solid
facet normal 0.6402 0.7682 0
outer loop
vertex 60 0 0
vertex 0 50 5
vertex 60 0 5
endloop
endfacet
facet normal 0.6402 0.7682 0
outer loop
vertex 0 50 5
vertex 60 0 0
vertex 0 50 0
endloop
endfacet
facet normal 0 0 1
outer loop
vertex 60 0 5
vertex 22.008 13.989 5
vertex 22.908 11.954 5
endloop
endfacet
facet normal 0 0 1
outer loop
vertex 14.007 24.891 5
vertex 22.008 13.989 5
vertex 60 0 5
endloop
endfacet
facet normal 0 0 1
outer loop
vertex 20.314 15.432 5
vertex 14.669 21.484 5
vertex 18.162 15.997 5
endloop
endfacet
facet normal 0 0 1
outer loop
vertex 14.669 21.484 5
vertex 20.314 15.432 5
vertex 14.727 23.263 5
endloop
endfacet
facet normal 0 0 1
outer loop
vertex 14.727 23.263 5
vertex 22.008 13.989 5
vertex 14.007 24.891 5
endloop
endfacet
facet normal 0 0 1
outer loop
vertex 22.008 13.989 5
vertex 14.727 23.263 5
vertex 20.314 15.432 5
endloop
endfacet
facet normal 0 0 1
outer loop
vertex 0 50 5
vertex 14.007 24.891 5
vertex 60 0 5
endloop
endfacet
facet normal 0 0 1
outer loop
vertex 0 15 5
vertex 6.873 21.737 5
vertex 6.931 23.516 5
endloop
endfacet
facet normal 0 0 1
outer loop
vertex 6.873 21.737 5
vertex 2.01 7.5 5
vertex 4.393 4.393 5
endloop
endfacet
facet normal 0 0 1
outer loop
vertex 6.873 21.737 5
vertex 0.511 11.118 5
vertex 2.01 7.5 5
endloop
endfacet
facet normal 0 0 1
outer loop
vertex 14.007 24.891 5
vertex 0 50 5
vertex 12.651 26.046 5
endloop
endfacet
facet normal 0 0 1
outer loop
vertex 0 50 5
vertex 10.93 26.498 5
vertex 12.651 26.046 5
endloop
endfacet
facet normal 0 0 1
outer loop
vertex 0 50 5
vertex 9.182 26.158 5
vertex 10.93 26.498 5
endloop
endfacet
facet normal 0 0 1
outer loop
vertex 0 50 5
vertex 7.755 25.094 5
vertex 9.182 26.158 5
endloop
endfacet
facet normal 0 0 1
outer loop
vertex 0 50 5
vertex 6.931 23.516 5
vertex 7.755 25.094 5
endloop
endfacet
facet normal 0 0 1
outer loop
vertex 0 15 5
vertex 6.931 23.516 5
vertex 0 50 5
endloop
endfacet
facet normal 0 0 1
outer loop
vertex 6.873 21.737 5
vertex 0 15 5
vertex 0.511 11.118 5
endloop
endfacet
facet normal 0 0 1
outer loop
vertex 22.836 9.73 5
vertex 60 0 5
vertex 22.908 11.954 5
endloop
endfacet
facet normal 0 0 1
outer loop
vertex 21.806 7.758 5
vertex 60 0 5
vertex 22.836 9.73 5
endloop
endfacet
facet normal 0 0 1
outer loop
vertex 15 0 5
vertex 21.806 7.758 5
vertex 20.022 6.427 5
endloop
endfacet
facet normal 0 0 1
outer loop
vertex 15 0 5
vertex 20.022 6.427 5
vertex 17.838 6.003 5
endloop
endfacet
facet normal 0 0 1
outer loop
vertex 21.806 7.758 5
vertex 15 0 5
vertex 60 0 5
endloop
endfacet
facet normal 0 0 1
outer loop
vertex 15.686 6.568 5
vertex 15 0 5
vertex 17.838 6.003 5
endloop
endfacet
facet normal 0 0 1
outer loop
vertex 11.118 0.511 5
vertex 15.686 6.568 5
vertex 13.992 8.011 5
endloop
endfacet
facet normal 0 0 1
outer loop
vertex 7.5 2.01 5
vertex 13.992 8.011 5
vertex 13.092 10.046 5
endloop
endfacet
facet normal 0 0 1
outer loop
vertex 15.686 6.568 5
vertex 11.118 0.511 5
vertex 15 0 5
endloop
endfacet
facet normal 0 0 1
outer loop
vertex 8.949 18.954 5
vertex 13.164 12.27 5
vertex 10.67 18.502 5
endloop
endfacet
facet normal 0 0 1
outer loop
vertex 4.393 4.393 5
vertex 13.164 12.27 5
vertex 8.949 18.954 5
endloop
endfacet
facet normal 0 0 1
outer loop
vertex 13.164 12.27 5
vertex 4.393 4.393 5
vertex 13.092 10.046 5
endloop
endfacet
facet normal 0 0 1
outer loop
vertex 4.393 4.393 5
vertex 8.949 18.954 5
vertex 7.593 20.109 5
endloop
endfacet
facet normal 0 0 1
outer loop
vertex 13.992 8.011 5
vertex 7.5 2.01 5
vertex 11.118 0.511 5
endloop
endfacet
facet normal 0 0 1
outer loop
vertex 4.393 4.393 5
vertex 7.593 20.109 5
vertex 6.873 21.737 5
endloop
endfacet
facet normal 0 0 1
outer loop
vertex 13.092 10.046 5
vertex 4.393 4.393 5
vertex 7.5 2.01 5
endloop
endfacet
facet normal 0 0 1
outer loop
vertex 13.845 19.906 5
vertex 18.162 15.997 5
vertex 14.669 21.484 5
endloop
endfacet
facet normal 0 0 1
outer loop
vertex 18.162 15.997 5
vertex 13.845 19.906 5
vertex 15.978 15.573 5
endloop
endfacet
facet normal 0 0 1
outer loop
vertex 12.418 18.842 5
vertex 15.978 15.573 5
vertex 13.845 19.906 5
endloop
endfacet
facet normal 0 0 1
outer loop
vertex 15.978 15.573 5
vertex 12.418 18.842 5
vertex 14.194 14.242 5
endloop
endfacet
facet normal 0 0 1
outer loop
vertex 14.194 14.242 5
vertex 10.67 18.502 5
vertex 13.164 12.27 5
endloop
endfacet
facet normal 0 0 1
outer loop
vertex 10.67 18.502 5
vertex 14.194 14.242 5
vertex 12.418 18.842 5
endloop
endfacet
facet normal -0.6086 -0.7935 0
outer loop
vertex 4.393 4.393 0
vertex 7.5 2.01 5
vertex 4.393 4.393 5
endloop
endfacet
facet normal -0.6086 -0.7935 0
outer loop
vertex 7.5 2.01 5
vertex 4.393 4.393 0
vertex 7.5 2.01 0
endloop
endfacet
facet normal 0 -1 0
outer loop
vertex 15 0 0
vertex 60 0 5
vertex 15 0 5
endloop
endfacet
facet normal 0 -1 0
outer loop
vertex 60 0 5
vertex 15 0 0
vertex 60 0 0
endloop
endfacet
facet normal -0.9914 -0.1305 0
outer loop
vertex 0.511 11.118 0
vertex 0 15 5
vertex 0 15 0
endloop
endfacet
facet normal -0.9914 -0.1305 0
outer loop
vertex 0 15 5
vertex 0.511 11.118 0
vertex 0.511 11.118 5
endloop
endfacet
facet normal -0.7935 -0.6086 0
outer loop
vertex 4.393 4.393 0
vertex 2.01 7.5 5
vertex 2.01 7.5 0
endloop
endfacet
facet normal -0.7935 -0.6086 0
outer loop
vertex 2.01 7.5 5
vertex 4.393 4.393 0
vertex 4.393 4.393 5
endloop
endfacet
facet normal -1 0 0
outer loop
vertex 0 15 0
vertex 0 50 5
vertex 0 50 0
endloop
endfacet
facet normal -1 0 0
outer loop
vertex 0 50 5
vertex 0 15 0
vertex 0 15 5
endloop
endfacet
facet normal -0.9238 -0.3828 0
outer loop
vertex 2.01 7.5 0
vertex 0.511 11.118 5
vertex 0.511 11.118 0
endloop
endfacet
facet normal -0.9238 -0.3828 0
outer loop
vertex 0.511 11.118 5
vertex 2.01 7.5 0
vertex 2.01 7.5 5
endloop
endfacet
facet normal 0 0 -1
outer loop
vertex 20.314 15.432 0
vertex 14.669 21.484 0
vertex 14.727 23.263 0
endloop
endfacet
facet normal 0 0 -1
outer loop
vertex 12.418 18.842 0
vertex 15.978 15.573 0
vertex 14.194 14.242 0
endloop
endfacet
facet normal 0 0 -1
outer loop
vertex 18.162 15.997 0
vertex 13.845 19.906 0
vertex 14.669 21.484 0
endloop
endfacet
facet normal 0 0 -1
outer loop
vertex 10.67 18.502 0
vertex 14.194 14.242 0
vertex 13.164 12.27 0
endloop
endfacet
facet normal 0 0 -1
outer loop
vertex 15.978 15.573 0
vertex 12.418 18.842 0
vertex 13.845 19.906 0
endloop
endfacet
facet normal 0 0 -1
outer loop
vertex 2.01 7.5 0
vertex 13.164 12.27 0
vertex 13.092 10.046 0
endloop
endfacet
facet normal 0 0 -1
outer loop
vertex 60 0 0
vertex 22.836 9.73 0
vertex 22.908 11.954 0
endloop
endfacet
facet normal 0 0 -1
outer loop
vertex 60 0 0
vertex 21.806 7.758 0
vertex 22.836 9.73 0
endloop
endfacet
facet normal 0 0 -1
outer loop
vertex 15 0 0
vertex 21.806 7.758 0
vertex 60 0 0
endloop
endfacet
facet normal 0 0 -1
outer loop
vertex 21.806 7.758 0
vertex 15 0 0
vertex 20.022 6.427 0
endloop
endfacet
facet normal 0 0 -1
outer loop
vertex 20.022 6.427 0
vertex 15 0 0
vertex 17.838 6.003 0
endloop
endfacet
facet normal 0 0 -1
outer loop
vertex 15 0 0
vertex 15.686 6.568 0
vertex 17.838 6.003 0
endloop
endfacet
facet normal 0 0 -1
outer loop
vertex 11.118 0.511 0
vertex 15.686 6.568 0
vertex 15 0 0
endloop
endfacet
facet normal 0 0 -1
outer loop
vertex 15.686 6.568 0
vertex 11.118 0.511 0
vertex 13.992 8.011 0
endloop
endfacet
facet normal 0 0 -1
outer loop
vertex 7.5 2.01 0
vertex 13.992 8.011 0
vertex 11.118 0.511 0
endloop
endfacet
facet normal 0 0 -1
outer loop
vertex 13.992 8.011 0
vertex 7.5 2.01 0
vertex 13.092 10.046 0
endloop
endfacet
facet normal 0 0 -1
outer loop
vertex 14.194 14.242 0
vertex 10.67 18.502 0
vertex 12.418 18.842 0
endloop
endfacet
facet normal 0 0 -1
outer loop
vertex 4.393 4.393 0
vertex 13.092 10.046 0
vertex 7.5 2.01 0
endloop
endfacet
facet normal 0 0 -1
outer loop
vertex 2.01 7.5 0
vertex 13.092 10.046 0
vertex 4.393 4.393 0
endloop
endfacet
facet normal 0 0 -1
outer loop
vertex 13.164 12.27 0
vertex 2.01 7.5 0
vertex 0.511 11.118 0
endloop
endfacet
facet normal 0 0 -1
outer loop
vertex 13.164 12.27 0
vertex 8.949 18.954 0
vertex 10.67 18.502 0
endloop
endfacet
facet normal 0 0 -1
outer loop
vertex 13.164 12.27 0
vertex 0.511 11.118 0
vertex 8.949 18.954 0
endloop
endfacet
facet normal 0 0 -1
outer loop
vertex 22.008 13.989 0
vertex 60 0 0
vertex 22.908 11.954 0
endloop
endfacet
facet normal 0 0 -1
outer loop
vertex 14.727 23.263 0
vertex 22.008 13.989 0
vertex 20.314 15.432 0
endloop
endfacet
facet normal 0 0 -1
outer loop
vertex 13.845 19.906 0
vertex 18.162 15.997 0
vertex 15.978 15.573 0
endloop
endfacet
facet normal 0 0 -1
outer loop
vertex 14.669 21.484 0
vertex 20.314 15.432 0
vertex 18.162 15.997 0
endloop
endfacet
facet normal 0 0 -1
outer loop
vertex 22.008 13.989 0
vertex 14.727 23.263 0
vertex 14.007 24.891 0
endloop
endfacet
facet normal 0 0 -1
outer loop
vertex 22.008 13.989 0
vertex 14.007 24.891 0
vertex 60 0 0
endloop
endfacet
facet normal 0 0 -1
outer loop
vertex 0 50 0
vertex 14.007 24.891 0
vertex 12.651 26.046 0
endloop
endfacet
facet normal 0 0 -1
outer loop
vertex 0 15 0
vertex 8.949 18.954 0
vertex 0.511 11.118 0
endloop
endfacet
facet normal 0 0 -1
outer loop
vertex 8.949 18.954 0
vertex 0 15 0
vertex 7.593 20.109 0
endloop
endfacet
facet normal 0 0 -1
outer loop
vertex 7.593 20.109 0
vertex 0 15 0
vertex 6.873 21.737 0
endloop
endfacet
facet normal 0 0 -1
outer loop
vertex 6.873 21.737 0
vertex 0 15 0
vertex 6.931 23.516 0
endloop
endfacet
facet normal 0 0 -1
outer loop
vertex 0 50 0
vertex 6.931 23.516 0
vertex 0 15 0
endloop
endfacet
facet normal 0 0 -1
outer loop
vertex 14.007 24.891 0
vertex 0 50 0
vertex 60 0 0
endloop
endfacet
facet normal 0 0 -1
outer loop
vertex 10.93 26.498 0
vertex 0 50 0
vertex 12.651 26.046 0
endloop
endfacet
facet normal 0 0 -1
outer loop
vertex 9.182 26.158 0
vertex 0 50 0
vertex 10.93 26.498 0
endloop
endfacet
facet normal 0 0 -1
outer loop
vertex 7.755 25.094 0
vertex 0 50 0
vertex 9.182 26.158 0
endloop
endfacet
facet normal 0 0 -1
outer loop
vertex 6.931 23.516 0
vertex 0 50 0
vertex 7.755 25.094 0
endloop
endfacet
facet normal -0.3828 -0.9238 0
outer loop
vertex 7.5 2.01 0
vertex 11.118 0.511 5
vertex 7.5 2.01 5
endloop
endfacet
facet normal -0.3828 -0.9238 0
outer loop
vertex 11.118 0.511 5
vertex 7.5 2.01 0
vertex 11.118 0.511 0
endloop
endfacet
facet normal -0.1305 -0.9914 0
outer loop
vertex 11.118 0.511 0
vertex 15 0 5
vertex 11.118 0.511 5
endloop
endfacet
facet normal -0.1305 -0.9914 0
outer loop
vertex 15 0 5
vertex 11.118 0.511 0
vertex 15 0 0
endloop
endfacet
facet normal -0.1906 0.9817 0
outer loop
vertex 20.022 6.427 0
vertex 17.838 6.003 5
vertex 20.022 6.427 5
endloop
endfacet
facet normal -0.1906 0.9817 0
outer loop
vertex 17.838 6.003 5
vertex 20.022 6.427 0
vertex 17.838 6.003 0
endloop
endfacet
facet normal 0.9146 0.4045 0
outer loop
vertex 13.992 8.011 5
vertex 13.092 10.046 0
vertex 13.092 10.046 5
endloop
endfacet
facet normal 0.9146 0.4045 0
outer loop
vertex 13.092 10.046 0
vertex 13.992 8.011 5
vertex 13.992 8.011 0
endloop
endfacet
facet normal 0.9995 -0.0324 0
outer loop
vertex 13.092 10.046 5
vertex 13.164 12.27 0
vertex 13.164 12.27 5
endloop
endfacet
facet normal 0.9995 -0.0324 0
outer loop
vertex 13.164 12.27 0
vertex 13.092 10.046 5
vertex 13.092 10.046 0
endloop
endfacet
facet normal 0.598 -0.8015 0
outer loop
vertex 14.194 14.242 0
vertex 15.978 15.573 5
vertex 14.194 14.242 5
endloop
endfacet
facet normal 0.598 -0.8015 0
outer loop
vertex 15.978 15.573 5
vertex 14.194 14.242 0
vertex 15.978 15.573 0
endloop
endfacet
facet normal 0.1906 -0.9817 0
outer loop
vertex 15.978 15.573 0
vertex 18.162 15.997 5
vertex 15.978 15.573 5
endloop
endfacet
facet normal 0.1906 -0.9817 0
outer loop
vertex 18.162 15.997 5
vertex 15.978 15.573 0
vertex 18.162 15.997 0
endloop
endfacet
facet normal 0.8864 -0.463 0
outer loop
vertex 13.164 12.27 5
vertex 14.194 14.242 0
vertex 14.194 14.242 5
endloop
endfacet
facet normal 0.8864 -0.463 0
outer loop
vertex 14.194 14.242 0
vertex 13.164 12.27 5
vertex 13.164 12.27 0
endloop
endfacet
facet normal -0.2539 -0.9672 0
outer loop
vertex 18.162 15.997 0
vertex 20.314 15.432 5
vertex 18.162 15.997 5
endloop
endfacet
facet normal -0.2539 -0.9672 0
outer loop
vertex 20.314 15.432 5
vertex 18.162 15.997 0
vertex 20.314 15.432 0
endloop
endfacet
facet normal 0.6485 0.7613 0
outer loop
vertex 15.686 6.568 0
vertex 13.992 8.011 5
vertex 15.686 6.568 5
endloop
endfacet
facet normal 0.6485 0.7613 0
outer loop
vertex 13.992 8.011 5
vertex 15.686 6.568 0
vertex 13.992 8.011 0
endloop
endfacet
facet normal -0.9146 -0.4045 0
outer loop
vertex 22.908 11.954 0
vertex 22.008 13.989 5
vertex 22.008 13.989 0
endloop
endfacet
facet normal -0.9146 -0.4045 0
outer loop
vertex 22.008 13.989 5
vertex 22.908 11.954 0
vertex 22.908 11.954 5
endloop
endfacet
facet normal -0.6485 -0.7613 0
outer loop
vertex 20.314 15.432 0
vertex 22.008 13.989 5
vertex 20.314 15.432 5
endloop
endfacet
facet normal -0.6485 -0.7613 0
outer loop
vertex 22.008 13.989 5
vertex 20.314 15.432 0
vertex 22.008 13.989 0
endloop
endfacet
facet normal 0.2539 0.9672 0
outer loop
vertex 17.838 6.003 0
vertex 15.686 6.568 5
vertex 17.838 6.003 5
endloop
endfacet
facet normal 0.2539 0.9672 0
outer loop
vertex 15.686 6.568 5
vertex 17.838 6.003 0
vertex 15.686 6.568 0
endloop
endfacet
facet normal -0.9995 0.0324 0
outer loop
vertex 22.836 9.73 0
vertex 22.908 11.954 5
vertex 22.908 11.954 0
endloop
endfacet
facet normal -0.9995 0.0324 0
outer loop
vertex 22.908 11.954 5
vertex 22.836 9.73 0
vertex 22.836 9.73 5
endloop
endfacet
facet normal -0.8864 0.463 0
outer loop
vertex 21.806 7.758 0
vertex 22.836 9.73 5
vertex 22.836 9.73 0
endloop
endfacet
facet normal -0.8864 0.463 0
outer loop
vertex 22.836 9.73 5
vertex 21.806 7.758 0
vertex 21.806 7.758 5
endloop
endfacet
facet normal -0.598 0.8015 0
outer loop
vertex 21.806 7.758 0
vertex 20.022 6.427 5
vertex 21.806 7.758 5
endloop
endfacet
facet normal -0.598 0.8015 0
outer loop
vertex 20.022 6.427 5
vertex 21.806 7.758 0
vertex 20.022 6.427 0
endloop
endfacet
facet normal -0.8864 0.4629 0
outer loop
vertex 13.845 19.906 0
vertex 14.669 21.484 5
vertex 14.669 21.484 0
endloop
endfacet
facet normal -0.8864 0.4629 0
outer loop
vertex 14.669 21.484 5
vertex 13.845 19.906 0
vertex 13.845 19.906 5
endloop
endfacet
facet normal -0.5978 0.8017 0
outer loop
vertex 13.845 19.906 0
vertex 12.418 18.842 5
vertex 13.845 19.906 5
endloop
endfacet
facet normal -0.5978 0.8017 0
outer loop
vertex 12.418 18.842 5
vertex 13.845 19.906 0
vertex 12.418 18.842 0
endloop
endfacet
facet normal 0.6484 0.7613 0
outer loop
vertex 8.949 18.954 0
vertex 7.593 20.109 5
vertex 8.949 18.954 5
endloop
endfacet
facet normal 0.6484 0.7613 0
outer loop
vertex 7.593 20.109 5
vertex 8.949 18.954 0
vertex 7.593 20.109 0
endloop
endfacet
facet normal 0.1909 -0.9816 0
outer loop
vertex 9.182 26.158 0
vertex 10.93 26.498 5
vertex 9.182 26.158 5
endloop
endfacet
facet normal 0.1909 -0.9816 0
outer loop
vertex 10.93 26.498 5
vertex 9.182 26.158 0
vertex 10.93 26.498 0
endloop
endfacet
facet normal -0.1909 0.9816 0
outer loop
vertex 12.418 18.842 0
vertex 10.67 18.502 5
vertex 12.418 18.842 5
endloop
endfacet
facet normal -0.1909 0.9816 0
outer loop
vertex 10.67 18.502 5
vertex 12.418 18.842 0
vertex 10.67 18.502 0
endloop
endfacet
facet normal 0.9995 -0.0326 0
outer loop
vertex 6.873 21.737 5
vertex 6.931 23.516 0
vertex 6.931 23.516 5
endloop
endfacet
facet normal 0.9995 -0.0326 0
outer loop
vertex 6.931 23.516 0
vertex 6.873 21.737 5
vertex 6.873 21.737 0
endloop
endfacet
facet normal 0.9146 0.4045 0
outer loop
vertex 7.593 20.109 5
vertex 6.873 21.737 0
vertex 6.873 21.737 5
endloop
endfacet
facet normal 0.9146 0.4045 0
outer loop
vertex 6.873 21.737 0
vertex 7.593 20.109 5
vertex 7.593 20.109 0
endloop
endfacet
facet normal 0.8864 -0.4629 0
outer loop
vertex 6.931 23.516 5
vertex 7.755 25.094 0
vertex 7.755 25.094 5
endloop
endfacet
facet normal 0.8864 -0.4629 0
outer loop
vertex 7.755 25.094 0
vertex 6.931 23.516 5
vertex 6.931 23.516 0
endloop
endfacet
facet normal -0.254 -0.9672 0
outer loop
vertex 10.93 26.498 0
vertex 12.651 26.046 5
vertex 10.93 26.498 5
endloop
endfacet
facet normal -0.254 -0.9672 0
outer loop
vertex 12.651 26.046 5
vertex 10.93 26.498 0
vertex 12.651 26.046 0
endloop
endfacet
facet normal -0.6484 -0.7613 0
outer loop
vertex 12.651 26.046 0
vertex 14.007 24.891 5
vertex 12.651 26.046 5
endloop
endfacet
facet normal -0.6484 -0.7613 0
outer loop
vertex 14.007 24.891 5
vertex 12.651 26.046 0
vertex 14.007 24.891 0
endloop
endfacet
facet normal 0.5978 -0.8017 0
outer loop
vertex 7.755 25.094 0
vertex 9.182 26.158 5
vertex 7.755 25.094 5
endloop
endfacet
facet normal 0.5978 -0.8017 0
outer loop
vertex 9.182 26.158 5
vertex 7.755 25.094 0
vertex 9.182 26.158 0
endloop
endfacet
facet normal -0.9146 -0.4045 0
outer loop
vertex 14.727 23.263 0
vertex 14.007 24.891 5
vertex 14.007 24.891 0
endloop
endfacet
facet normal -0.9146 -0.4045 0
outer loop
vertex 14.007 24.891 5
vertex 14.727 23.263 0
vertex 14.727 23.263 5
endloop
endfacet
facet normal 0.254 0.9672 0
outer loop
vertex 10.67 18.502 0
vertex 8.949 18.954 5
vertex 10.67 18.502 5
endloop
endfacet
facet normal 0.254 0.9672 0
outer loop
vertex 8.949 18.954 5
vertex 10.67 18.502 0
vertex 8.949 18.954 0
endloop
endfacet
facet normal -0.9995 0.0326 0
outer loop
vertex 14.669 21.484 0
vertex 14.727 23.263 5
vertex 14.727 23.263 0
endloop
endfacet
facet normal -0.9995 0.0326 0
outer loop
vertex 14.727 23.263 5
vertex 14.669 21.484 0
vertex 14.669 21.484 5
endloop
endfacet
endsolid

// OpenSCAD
$fn = 32;

// ----------------------------------------------------------------------
// Bracket plate: corner pad 60 x 50, fillet R15
// ----------------------------------------------------------------------

// --- parameters (mm) ---
hole_r = 4;               // bolt hole radius
plate_t = 5;              // plate thickness, Z (extrusion height)
leg_a = 60;               // base leg
leg_b = 50;               // height leg
fillet_r = 15;            // right-angle fillet radius

hole_d1 = 2 * hole_r + 2;
hole_d2 = 2 * hole_r;

profile = [[15, 0], [60, 0], [0, 50], [0, 15], [0.511, 11.118], [2.01, 7.5], [4.393, 4.393], [7.5, 2.01], [11.118, 0.511]];  // primary outline, 9 points, counter clockwise
void_1 = [[22.908, 11.954], [22.008, 13.989], [20.314, 15.432], [18.162, 15.997], [15.978, 15.573], [14.194, 14.242], [13.164, 12.27], [13.092, 10.046], [13.992, 8.011], [15.686, 6.568], [17.838, 6.003], [20.022, 6.427], [21.806, 7.758], [22.836, 9.73]];  // mount hole 1, 14 points
void_2 = [[14.727, 23.263], [14.007, 24.891], [12.651, 26.046], [10.93, 26.498], [9.182, 26.158], [7.755, 25.094], [6.931, 23.516], [6.873, 21.737], [7.593, 20.109], [8.949, 18.954], [10.67, 18.502], [12.418, 18.842], [13.845, 19.906], [14.669, 21.484]];  // mount hole 2, 14 points

// --- the one profile operation ---
difference() {
  linear_extrude(height = plate_t) polygon(points = profile);
  translate([0, 0, -1])
    linear_extrude(height = plate_t + 2) polygon(points = void_1);
  translate([0, 0, -1])
    linear_extrude(height = plate_t + 2) polygon(points = void_2);
}
